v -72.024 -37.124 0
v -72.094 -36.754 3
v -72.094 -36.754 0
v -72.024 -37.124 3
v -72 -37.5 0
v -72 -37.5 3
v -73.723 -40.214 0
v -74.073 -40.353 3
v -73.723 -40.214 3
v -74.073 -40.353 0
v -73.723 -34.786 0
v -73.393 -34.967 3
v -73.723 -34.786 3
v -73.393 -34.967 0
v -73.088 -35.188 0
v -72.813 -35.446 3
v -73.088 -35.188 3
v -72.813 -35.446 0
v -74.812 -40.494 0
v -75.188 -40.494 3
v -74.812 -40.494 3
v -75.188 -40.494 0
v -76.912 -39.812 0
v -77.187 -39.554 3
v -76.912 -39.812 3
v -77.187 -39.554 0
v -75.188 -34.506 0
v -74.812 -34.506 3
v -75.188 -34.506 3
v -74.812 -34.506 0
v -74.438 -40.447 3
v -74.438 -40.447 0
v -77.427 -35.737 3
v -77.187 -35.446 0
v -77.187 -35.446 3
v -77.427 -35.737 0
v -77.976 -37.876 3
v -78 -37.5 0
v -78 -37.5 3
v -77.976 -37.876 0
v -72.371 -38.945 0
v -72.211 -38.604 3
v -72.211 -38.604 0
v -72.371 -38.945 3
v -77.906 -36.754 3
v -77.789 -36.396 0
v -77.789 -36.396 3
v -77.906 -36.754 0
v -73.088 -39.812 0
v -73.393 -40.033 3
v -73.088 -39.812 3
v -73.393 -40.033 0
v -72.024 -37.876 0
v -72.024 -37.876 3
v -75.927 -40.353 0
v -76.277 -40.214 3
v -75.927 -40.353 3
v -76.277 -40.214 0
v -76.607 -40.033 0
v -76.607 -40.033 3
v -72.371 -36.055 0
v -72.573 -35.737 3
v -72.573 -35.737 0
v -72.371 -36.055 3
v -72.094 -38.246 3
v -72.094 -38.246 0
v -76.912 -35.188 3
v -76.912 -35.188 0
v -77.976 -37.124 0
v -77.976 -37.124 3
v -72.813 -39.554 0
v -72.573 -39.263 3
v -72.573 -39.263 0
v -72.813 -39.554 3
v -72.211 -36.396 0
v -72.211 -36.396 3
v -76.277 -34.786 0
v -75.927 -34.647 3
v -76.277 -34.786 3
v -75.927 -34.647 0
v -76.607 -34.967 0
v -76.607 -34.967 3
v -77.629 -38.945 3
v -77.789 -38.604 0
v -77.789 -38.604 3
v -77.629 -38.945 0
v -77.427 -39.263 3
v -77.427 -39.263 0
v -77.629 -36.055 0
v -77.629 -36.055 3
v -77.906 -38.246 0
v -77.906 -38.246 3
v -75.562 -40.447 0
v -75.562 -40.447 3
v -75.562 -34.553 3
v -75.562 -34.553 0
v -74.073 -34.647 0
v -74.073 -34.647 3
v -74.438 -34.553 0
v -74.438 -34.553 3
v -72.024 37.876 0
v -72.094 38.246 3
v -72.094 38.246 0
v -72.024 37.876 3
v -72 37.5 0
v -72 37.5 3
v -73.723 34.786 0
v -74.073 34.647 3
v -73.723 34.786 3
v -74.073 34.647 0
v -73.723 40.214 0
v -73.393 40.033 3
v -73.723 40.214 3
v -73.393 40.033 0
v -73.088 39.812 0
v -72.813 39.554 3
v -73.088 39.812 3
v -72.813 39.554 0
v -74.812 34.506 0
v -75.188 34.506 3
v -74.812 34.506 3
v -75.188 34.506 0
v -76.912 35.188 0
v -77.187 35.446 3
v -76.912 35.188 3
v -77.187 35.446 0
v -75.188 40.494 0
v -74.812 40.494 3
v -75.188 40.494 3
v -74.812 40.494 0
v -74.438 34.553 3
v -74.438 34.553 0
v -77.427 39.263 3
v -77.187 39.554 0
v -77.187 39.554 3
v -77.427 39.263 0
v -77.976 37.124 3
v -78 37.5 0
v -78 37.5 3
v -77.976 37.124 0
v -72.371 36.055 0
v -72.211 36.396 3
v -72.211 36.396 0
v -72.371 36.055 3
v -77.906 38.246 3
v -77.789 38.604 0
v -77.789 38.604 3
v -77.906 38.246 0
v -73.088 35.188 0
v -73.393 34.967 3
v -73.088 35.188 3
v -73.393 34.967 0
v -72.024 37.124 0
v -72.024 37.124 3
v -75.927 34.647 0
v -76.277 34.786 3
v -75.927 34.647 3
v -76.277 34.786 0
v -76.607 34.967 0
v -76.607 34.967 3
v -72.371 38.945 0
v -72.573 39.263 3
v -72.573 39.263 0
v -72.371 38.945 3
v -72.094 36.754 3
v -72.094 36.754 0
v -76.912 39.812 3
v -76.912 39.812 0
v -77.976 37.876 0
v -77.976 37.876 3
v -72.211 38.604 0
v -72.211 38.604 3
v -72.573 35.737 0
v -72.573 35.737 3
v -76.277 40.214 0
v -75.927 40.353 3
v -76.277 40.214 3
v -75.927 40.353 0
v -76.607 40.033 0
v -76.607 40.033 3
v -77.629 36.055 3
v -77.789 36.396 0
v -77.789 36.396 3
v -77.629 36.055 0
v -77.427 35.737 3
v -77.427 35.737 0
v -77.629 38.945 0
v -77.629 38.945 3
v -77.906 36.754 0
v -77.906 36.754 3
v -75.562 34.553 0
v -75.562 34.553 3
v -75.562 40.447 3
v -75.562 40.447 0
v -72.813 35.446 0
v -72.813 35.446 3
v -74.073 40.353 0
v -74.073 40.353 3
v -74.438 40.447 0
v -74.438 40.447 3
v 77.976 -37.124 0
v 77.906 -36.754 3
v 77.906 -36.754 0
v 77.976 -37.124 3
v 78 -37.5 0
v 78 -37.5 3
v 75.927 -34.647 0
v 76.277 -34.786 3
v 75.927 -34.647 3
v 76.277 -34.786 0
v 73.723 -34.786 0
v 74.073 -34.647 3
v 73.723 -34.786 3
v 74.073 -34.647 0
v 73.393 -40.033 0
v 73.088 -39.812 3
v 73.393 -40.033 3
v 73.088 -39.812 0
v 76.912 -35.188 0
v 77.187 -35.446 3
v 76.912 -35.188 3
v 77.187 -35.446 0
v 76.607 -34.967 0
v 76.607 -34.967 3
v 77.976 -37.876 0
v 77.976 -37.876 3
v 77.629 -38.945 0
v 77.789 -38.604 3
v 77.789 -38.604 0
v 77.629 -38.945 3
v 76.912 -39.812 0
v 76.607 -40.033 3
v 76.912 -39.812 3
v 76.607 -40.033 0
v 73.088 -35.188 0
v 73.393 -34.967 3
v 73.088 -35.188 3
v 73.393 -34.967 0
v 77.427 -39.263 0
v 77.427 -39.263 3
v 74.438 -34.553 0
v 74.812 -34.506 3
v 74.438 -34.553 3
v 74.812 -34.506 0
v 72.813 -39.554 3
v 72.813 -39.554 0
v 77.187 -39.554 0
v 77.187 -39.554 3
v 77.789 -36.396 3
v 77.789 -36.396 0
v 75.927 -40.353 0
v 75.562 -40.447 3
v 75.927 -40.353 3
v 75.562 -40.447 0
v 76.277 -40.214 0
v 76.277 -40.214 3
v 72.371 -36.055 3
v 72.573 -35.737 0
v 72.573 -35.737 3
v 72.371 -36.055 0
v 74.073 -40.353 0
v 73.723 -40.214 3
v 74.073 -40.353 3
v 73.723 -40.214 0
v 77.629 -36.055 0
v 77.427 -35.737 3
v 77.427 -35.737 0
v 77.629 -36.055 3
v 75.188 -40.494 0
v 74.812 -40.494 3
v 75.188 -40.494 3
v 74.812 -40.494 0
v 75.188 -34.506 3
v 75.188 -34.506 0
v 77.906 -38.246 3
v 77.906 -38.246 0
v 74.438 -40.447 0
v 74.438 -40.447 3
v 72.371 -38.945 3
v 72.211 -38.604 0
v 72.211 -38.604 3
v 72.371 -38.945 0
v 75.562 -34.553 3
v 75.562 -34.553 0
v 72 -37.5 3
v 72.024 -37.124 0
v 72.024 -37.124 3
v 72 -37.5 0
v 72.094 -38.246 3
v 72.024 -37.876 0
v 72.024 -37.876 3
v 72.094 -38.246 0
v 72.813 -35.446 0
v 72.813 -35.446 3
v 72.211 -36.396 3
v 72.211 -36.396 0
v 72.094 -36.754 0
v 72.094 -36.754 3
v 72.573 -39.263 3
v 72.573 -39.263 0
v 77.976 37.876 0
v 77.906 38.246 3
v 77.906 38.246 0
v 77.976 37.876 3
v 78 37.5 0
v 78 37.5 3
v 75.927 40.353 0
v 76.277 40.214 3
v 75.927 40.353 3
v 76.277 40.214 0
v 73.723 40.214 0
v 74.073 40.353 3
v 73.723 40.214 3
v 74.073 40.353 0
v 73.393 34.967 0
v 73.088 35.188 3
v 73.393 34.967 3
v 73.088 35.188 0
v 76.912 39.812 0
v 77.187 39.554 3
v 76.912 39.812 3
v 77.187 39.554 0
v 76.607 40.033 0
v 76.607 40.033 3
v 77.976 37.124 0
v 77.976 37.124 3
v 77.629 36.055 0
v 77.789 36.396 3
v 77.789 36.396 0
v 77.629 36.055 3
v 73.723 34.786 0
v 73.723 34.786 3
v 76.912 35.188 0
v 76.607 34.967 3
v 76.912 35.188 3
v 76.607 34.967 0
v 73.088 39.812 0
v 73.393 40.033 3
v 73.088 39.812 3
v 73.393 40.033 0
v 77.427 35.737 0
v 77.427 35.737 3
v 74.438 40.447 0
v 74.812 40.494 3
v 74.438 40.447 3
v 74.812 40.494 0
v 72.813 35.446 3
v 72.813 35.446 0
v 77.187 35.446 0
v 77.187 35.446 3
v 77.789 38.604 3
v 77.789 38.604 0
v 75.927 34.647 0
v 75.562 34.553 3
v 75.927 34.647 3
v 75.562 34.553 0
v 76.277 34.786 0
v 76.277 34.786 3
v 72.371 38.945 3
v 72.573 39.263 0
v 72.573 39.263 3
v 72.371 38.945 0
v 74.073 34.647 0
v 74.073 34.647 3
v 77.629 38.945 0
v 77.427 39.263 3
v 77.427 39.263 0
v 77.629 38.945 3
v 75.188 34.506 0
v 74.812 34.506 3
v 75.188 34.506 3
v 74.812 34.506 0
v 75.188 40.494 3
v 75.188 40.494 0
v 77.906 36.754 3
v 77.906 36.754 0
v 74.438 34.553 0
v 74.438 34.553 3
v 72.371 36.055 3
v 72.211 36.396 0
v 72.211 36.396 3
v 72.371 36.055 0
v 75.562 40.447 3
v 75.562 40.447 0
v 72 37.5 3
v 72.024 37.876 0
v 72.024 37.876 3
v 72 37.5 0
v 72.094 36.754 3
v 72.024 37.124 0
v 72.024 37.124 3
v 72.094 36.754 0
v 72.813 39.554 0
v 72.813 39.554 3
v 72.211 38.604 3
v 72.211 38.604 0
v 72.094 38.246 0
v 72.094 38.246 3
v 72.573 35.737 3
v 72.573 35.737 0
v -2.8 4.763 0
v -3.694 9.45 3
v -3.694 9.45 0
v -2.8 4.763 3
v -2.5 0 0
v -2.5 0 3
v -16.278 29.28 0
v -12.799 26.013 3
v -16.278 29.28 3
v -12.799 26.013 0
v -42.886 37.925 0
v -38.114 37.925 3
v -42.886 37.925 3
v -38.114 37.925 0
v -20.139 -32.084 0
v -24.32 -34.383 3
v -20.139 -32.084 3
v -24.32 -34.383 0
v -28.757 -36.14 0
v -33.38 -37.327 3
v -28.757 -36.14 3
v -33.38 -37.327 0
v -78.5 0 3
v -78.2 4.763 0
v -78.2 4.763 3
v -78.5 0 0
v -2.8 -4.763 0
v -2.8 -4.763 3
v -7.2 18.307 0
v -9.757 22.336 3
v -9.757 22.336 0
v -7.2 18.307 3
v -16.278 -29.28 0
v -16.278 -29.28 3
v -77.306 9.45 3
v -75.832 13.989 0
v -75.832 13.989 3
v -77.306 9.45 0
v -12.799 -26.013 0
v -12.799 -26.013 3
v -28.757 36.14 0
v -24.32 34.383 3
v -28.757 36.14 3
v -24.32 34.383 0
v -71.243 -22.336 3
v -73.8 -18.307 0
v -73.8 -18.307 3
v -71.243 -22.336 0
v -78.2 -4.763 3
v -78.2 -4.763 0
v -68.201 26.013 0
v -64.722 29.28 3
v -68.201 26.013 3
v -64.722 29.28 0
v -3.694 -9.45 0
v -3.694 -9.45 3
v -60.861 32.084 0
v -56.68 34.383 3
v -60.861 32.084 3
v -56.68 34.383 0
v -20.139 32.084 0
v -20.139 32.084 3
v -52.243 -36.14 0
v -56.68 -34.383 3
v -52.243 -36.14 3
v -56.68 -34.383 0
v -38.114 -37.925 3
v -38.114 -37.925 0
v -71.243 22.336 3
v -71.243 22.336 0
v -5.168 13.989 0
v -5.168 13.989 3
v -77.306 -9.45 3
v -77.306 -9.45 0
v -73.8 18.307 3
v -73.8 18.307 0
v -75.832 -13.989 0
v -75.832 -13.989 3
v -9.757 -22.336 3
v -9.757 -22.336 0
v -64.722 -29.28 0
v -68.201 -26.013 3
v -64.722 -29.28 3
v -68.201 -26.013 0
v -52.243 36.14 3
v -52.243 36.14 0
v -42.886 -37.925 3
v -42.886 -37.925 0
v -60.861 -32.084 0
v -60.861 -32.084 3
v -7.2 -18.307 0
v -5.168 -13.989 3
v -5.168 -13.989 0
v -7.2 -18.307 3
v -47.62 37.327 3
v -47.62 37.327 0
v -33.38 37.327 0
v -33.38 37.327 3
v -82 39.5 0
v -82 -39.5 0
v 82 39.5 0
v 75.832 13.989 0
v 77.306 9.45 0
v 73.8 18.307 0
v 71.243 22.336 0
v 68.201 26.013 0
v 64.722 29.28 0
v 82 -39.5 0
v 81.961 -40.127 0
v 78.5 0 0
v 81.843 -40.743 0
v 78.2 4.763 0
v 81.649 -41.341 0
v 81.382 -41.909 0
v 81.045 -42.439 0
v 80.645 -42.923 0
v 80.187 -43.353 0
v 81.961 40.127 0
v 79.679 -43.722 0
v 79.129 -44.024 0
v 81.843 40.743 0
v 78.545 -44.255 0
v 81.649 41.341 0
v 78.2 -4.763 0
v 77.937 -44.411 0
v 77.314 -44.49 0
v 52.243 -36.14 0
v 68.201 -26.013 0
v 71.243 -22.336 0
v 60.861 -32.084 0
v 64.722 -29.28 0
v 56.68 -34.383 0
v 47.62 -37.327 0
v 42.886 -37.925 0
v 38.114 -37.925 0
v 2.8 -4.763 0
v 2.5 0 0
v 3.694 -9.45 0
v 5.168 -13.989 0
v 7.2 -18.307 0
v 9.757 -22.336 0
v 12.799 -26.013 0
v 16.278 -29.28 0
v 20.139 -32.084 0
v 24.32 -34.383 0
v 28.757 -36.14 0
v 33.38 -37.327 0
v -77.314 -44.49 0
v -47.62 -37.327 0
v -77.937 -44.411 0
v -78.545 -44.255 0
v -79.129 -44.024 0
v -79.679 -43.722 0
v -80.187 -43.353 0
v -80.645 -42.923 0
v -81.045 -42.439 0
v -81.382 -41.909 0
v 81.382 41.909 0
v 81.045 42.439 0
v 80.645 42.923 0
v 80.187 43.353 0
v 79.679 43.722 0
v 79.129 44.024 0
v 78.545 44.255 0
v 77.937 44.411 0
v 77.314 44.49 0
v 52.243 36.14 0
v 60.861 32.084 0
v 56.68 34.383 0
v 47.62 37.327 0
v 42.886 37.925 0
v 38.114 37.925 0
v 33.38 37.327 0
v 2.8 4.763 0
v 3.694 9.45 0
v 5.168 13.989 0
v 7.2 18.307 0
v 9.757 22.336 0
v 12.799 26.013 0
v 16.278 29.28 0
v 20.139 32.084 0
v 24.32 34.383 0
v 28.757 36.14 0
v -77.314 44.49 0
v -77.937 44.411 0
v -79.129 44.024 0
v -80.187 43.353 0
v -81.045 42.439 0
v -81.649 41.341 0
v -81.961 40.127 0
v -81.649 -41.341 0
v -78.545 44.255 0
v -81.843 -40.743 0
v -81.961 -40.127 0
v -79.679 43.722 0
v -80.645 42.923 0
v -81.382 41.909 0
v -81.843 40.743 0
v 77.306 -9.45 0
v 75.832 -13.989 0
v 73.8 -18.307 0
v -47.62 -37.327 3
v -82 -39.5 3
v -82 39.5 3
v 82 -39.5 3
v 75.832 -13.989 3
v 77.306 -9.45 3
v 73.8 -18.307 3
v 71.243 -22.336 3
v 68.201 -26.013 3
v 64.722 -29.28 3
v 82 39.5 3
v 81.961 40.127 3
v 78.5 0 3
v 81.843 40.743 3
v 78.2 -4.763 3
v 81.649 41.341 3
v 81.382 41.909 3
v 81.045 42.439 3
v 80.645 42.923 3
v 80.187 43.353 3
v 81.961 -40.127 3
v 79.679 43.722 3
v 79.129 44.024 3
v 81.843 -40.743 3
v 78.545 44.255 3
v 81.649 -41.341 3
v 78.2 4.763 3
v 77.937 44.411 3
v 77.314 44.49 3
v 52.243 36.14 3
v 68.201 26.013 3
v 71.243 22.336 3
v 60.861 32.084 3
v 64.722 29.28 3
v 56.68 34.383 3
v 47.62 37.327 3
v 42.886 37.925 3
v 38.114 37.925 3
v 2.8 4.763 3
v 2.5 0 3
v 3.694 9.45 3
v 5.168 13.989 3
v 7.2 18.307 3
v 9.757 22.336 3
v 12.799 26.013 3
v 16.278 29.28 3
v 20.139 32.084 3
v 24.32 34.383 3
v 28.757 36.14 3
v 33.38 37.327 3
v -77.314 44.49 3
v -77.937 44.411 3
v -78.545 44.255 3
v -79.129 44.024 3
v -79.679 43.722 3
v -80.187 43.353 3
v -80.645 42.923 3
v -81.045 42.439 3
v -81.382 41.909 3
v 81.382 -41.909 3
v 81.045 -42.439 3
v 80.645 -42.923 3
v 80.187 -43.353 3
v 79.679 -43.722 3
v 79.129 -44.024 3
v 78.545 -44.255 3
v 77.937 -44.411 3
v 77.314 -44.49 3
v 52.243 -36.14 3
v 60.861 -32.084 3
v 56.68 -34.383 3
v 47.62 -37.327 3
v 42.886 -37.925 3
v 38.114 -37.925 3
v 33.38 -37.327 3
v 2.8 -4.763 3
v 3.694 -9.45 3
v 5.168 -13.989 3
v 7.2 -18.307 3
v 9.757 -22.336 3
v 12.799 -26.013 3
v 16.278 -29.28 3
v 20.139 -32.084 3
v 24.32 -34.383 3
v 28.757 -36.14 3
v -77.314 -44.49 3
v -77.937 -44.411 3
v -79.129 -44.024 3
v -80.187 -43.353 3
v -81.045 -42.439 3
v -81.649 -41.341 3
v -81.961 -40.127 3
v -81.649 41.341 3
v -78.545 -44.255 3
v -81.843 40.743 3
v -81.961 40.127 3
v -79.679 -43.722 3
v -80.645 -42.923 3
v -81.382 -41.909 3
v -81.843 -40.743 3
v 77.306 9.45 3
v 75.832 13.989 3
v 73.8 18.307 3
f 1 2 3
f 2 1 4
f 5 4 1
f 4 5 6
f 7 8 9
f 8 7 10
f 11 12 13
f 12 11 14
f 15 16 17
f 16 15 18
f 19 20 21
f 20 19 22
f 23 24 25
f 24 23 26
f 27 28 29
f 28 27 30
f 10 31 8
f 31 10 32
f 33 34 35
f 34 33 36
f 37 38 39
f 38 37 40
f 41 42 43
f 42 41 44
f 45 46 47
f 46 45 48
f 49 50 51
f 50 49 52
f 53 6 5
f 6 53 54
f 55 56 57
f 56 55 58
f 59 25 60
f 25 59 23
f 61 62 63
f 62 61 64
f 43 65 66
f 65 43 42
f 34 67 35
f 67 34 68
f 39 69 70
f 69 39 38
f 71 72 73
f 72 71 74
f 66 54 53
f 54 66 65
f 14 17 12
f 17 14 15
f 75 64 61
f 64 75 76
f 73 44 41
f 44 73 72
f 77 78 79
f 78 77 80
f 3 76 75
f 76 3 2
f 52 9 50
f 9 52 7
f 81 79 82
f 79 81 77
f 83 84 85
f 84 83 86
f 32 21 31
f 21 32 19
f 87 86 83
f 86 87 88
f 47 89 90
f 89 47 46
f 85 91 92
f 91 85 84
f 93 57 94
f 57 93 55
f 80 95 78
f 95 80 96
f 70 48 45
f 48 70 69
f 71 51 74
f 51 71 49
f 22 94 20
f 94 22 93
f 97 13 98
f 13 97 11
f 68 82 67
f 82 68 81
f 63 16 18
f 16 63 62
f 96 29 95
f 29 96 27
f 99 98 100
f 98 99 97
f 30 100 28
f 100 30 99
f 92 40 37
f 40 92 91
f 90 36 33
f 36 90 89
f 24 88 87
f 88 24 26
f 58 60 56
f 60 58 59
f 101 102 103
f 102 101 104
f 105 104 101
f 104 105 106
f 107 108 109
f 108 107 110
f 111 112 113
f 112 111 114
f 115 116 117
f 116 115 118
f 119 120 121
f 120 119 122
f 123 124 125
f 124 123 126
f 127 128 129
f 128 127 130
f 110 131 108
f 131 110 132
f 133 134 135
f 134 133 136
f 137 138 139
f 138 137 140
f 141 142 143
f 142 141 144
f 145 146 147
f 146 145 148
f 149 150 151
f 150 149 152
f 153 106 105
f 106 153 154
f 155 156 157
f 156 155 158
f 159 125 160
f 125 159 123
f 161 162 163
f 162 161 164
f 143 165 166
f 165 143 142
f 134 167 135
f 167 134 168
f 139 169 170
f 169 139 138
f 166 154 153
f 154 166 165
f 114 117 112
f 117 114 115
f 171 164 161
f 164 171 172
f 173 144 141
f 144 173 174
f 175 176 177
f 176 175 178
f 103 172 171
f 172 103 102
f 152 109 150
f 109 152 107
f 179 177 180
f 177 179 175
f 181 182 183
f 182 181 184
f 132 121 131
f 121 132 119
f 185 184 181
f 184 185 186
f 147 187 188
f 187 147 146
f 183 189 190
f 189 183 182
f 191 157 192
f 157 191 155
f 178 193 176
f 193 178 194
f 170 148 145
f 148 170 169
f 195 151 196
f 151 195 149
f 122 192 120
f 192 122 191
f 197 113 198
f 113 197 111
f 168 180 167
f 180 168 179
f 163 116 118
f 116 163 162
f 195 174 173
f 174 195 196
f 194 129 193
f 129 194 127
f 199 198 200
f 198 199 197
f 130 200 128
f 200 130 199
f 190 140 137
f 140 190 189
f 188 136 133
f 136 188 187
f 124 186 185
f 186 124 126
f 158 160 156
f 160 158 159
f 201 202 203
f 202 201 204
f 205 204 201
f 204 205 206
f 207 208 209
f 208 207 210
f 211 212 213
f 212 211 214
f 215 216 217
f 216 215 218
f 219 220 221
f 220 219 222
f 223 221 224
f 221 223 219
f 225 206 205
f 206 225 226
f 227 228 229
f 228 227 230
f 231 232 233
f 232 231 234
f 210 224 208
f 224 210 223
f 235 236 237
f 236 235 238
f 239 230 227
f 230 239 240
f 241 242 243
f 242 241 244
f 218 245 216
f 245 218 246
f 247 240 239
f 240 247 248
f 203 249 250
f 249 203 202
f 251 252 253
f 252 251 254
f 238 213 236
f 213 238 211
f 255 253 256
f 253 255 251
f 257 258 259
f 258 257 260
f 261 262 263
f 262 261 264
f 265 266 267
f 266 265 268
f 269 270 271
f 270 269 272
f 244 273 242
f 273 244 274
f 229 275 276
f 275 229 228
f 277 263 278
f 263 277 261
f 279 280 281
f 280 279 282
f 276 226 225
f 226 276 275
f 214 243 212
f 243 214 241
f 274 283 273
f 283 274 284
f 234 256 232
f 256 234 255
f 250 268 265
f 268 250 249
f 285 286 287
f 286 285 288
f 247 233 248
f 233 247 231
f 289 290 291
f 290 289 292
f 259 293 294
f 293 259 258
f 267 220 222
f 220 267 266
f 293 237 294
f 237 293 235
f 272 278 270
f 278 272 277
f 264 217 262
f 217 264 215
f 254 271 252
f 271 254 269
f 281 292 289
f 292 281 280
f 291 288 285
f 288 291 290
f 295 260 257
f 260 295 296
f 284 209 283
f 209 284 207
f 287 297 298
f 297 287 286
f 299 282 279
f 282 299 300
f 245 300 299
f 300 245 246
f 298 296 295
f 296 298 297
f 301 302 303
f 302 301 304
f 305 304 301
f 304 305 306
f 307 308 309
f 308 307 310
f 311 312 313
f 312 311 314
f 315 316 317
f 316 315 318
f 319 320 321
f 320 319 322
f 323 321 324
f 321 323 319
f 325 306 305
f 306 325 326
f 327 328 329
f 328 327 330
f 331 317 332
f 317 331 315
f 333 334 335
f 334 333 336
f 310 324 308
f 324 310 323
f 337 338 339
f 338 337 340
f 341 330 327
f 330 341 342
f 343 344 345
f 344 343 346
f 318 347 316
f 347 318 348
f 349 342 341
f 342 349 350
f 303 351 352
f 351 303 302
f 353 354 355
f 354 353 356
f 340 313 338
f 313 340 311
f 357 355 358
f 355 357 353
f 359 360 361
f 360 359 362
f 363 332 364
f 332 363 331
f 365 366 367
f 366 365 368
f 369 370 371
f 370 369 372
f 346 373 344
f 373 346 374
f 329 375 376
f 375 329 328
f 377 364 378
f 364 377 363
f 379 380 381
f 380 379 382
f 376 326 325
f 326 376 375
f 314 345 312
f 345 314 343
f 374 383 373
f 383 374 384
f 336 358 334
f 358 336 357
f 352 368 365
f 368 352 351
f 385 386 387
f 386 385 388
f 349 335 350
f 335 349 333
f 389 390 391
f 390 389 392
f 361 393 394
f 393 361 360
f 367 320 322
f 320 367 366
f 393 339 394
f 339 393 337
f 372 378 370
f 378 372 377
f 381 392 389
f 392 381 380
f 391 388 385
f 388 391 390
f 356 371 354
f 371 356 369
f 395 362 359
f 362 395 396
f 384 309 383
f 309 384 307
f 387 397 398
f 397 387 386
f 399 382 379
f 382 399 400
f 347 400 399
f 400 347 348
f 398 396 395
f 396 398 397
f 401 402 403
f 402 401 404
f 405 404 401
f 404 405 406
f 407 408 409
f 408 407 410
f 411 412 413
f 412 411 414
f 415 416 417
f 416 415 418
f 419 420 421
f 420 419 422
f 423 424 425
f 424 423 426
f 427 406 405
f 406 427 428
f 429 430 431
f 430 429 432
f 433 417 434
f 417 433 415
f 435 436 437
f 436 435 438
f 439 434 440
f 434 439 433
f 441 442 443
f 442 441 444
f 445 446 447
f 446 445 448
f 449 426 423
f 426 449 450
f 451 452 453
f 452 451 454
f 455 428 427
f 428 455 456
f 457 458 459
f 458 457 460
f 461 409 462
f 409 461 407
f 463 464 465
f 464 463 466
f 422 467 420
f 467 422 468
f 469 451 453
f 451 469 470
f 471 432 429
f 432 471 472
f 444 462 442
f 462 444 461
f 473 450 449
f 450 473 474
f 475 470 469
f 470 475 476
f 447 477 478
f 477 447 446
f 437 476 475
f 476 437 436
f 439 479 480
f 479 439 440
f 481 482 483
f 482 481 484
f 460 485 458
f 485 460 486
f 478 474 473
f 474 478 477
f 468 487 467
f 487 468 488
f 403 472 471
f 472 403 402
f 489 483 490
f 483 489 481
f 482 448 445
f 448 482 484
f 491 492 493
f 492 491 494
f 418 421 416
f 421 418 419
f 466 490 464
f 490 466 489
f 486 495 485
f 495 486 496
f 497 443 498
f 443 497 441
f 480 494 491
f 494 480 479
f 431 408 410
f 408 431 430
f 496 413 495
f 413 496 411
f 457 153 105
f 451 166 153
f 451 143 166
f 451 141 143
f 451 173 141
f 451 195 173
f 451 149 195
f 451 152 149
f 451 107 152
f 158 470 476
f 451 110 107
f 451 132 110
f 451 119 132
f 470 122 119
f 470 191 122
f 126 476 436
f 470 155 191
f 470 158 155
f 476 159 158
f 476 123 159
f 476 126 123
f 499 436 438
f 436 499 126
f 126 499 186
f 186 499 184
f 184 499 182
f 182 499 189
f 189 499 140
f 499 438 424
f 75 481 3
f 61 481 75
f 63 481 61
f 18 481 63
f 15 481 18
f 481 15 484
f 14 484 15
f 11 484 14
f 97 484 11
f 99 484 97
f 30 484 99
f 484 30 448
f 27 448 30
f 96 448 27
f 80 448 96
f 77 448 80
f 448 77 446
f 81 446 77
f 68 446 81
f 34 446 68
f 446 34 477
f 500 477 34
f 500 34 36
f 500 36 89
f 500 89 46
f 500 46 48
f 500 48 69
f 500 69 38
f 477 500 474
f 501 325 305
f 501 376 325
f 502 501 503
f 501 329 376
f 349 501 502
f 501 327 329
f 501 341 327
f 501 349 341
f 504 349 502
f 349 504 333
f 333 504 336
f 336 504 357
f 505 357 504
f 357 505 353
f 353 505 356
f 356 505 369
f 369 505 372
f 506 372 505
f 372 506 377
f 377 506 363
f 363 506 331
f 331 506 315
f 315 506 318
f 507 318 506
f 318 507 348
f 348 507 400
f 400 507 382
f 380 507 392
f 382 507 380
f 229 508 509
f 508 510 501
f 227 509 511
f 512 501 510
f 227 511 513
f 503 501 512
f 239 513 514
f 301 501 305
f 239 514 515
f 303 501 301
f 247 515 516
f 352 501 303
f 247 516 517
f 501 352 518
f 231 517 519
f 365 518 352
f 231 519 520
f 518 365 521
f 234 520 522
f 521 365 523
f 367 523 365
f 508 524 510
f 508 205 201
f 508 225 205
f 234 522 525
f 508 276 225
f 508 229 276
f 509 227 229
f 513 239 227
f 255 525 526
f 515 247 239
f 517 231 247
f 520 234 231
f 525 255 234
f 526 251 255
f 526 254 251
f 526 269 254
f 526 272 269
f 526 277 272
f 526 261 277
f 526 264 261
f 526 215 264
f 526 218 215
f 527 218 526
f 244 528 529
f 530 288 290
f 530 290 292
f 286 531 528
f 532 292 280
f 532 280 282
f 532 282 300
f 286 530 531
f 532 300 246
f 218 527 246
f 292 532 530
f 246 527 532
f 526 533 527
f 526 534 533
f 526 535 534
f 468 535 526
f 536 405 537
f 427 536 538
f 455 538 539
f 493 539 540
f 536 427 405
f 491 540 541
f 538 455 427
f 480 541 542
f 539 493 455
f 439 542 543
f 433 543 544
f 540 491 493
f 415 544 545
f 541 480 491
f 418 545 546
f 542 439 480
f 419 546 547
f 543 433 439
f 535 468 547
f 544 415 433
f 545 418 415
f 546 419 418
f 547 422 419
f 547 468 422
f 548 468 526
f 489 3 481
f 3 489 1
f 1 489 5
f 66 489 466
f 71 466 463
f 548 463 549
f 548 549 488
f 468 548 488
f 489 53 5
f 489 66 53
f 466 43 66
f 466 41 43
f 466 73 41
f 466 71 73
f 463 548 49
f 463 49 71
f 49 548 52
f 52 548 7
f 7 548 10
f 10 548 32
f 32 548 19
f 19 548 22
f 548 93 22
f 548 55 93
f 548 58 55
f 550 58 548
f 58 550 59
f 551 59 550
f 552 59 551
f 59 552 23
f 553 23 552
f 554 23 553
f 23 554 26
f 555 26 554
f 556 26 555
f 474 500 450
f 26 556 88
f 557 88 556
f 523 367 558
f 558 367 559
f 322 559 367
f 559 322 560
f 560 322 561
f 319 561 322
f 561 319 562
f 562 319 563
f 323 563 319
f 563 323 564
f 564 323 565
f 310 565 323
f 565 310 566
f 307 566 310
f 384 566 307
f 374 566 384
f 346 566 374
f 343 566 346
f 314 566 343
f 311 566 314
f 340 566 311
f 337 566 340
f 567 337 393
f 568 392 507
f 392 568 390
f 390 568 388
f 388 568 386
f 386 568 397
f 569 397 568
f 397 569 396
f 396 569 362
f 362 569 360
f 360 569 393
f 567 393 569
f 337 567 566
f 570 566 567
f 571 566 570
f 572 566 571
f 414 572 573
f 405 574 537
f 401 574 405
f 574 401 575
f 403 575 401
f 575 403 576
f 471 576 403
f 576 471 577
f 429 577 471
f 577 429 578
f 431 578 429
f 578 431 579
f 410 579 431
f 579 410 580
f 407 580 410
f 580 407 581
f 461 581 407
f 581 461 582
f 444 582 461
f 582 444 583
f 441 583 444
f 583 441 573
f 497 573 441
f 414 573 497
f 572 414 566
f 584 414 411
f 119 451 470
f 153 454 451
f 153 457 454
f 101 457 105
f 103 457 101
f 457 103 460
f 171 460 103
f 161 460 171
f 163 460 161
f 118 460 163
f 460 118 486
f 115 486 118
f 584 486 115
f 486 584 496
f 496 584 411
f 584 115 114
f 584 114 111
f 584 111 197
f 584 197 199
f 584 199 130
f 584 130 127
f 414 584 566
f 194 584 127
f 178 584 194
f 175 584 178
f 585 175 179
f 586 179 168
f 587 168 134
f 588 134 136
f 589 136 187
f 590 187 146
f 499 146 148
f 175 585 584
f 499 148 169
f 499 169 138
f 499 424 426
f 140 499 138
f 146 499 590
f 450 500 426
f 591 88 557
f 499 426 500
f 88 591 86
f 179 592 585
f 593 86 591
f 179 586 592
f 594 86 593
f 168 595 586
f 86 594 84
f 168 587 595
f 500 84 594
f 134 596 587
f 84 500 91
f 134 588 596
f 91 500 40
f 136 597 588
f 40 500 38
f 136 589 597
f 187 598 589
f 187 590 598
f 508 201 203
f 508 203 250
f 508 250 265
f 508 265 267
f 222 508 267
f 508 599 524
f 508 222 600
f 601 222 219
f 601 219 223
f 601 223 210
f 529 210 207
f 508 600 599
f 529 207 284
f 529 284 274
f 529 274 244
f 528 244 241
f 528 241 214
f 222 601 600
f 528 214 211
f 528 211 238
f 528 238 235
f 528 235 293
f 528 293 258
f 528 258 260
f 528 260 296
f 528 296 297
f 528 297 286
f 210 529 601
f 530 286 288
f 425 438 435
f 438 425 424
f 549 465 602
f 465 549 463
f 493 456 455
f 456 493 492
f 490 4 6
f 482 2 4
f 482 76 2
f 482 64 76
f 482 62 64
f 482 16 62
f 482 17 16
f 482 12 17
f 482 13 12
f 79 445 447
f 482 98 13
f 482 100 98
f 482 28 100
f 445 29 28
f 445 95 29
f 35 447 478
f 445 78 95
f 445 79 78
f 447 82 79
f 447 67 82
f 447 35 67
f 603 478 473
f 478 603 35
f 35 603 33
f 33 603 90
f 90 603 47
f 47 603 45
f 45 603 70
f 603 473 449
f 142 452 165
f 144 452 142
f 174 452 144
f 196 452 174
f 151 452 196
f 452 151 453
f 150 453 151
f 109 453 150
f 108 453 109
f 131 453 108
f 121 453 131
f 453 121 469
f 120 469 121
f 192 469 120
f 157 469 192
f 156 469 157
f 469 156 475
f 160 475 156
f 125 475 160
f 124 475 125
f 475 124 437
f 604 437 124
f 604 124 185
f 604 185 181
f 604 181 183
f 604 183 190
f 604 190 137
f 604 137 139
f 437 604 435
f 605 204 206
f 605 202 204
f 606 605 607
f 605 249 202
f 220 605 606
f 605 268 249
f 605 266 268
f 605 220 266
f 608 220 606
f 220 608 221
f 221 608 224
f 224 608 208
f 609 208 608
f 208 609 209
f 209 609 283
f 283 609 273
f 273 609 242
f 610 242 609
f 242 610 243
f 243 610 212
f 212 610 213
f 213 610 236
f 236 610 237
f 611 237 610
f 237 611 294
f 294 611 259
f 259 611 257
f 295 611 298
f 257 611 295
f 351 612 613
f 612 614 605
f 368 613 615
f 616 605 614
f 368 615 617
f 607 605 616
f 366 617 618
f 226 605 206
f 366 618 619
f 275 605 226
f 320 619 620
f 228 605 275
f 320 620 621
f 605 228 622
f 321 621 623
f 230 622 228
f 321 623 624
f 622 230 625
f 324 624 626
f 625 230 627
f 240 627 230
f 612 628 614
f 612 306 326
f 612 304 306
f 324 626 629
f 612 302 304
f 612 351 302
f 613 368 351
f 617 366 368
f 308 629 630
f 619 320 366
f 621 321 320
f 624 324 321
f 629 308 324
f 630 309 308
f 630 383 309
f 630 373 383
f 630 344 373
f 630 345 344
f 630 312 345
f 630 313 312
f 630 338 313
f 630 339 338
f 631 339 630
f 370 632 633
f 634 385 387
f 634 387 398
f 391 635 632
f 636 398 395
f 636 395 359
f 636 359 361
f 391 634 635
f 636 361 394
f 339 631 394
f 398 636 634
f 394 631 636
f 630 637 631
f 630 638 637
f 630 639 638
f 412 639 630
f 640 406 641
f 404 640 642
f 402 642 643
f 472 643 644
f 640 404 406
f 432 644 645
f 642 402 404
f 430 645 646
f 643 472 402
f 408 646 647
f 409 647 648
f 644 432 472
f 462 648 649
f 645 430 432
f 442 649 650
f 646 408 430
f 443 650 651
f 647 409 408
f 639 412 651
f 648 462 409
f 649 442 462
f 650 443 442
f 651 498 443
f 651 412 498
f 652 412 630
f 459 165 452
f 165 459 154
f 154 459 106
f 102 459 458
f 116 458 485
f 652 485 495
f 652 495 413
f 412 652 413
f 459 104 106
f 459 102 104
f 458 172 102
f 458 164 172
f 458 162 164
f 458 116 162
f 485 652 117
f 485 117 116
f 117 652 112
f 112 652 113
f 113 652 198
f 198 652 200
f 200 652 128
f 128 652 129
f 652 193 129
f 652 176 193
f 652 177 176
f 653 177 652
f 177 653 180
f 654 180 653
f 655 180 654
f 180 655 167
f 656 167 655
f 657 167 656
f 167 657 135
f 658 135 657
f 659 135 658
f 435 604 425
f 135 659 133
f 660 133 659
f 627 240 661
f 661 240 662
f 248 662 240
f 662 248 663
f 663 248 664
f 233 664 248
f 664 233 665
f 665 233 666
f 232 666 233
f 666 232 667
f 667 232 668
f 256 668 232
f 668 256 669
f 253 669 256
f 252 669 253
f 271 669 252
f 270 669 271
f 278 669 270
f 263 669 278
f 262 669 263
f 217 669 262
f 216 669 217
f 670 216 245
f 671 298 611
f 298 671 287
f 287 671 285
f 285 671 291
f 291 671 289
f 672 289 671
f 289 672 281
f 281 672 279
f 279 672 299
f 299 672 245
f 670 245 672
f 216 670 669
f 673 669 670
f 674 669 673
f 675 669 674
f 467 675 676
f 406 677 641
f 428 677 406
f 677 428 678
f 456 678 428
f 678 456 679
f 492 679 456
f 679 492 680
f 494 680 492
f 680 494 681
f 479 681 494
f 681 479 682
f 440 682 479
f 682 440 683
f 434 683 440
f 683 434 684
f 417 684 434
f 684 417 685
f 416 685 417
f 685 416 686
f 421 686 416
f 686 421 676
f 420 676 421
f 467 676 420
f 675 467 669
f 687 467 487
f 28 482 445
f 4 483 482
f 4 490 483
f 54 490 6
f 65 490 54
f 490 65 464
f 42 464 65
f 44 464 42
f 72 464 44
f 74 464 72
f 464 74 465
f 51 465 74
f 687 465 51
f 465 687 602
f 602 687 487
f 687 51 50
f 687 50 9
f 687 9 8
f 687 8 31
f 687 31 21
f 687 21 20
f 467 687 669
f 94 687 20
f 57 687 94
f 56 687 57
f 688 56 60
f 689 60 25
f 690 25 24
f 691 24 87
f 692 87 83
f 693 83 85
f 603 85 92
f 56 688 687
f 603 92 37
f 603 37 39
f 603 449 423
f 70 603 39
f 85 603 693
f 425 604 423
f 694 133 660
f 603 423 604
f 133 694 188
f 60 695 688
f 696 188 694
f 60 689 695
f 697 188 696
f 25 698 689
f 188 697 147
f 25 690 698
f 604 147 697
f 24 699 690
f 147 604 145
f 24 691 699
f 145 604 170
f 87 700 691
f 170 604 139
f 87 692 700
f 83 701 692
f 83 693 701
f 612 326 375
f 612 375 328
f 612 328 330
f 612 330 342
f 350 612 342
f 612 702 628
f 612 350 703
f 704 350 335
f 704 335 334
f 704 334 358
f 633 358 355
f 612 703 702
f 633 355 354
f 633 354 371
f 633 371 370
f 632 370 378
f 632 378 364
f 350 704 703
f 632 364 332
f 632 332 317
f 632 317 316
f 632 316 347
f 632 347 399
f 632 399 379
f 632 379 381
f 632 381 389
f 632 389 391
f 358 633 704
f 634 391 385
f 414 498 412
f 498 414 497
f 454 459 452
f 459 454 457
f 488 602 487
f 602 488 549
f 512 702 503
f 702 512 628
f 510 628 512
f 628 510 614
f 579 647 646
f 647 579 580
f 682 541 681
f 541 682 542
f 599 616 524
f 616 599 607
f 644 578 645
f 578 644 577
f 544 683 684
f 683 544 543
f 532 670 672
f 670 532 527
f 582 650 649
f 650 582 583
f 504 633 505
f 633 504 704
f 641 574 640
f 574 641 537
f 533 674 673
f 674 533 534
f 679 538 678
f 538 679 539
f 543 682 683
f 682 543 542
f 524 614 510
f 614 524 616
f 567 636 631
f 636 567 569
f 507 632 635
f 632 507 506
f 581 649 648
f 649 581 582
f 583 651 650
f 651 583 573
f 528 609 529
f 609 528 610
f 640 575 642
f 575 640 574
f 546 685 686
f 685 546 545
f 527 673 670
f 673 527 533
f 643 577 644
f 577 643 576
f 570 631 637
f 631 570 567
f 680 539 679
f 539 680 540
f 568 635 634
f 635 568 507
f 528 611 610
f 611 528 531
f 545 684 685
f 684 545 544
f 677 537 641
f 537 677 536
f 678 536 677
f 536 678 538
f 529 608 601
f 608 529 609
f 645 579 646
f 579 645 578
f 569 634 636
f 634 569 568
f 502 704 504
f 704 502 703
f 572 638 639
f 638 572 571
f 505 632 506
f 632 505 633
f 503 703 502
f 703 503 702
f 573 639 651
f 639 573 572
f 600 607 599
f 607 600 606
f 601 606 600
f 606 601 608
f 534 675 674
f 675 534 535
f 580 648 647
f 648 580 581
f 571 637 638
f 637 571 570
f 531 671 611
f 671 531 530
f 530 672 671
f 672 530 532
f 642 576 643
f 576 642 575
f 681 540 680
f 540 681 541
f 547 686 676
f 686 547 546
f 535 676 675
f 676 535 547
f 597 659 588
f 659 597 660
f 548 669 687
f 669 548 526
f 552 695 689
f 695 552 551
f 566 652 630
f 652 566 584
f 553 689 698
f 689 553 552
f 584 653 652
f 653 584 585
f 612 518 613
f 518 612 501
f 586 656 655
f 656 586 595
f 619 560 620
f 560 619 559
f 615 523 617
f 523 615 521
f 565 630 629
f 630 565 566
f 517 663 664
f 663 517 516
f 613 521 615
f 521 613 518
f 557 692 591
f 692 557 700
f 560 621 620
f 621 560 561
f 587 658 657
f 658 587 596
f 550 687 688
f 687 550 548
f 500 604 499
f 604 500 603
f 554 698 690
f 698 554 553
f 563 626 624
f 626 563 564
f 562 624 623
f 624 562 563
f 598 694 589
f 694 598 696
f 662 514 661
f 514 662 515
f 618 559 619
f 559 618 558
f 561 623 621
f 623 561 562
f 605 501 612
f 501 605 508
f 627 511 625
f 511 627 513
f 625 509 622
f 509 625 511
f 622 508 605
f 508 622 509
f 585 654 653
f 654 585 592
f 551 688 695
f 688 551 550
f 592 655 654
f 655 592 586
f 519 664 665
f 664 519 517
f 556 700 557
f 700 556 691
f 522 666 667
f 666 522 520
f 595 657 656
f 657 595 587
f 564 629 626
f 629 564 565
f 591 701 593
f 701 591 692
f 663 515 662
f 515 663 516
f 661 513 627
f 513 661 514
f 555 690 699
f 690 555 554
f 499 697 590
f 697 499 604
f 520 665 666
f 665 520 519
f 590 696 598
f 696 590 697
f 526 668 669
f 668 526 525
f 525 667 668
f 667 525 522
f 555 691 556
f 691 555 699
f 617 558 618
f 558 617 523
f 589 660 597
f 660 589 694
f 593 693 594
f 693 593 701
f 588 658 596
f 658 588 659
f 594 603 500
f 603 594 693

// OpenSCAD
$fn = 50;


difference() {
	union() {
		hull() {
			translate(v = [-77.0000000000, 39.5000000000, 0]) {
				cylinder(h = 3, r = 5);
			}
			translate(v = [77.0000000000, 39.5000000000, 0]) {
				cylinder(h = 3, r = 5);
			}
			translate(v = [-77.0000000000, -39.5000000000, 0]) {
				cylinder(h = 3, r = 5);
			}
			translate(v = [77.0000000000, -39.5000000000, 0]) {
				cylinder(h = 3, r = 5);
			}
		}
	}
	union() {
		#translate(v = [-75.0000000000, -37.5000000000, -100.0000000000]) {
			cylinder(h = 200, r = 3.0000000000);
		}
		#translate(v = [-75.0000000000, 37.5000000000, -100.0000000000]) {
			cylinder(h = 200, r = 3.0000000000);
		}
		#translate(v = [75.0000000000, -37.5000000000, -100.0000000000]) {
			cylinder(h = 200, r = 3.0000000000);
		}
		#translate(v = [75.0000000000, 37.5000000000, -100.0000000000]) {
			cylinder(h = 200, r = 3.0000000000);
		}
		#translate(v = [-40.5000000000, 0, 0]) {
			cylinder(h = 3, r = 38.0000000000);
		}
		#translate(v = [40.5000000000, 0, 0]) {
			cylinder(h = 3, r = 38.0000000000);
		}
	}
}
